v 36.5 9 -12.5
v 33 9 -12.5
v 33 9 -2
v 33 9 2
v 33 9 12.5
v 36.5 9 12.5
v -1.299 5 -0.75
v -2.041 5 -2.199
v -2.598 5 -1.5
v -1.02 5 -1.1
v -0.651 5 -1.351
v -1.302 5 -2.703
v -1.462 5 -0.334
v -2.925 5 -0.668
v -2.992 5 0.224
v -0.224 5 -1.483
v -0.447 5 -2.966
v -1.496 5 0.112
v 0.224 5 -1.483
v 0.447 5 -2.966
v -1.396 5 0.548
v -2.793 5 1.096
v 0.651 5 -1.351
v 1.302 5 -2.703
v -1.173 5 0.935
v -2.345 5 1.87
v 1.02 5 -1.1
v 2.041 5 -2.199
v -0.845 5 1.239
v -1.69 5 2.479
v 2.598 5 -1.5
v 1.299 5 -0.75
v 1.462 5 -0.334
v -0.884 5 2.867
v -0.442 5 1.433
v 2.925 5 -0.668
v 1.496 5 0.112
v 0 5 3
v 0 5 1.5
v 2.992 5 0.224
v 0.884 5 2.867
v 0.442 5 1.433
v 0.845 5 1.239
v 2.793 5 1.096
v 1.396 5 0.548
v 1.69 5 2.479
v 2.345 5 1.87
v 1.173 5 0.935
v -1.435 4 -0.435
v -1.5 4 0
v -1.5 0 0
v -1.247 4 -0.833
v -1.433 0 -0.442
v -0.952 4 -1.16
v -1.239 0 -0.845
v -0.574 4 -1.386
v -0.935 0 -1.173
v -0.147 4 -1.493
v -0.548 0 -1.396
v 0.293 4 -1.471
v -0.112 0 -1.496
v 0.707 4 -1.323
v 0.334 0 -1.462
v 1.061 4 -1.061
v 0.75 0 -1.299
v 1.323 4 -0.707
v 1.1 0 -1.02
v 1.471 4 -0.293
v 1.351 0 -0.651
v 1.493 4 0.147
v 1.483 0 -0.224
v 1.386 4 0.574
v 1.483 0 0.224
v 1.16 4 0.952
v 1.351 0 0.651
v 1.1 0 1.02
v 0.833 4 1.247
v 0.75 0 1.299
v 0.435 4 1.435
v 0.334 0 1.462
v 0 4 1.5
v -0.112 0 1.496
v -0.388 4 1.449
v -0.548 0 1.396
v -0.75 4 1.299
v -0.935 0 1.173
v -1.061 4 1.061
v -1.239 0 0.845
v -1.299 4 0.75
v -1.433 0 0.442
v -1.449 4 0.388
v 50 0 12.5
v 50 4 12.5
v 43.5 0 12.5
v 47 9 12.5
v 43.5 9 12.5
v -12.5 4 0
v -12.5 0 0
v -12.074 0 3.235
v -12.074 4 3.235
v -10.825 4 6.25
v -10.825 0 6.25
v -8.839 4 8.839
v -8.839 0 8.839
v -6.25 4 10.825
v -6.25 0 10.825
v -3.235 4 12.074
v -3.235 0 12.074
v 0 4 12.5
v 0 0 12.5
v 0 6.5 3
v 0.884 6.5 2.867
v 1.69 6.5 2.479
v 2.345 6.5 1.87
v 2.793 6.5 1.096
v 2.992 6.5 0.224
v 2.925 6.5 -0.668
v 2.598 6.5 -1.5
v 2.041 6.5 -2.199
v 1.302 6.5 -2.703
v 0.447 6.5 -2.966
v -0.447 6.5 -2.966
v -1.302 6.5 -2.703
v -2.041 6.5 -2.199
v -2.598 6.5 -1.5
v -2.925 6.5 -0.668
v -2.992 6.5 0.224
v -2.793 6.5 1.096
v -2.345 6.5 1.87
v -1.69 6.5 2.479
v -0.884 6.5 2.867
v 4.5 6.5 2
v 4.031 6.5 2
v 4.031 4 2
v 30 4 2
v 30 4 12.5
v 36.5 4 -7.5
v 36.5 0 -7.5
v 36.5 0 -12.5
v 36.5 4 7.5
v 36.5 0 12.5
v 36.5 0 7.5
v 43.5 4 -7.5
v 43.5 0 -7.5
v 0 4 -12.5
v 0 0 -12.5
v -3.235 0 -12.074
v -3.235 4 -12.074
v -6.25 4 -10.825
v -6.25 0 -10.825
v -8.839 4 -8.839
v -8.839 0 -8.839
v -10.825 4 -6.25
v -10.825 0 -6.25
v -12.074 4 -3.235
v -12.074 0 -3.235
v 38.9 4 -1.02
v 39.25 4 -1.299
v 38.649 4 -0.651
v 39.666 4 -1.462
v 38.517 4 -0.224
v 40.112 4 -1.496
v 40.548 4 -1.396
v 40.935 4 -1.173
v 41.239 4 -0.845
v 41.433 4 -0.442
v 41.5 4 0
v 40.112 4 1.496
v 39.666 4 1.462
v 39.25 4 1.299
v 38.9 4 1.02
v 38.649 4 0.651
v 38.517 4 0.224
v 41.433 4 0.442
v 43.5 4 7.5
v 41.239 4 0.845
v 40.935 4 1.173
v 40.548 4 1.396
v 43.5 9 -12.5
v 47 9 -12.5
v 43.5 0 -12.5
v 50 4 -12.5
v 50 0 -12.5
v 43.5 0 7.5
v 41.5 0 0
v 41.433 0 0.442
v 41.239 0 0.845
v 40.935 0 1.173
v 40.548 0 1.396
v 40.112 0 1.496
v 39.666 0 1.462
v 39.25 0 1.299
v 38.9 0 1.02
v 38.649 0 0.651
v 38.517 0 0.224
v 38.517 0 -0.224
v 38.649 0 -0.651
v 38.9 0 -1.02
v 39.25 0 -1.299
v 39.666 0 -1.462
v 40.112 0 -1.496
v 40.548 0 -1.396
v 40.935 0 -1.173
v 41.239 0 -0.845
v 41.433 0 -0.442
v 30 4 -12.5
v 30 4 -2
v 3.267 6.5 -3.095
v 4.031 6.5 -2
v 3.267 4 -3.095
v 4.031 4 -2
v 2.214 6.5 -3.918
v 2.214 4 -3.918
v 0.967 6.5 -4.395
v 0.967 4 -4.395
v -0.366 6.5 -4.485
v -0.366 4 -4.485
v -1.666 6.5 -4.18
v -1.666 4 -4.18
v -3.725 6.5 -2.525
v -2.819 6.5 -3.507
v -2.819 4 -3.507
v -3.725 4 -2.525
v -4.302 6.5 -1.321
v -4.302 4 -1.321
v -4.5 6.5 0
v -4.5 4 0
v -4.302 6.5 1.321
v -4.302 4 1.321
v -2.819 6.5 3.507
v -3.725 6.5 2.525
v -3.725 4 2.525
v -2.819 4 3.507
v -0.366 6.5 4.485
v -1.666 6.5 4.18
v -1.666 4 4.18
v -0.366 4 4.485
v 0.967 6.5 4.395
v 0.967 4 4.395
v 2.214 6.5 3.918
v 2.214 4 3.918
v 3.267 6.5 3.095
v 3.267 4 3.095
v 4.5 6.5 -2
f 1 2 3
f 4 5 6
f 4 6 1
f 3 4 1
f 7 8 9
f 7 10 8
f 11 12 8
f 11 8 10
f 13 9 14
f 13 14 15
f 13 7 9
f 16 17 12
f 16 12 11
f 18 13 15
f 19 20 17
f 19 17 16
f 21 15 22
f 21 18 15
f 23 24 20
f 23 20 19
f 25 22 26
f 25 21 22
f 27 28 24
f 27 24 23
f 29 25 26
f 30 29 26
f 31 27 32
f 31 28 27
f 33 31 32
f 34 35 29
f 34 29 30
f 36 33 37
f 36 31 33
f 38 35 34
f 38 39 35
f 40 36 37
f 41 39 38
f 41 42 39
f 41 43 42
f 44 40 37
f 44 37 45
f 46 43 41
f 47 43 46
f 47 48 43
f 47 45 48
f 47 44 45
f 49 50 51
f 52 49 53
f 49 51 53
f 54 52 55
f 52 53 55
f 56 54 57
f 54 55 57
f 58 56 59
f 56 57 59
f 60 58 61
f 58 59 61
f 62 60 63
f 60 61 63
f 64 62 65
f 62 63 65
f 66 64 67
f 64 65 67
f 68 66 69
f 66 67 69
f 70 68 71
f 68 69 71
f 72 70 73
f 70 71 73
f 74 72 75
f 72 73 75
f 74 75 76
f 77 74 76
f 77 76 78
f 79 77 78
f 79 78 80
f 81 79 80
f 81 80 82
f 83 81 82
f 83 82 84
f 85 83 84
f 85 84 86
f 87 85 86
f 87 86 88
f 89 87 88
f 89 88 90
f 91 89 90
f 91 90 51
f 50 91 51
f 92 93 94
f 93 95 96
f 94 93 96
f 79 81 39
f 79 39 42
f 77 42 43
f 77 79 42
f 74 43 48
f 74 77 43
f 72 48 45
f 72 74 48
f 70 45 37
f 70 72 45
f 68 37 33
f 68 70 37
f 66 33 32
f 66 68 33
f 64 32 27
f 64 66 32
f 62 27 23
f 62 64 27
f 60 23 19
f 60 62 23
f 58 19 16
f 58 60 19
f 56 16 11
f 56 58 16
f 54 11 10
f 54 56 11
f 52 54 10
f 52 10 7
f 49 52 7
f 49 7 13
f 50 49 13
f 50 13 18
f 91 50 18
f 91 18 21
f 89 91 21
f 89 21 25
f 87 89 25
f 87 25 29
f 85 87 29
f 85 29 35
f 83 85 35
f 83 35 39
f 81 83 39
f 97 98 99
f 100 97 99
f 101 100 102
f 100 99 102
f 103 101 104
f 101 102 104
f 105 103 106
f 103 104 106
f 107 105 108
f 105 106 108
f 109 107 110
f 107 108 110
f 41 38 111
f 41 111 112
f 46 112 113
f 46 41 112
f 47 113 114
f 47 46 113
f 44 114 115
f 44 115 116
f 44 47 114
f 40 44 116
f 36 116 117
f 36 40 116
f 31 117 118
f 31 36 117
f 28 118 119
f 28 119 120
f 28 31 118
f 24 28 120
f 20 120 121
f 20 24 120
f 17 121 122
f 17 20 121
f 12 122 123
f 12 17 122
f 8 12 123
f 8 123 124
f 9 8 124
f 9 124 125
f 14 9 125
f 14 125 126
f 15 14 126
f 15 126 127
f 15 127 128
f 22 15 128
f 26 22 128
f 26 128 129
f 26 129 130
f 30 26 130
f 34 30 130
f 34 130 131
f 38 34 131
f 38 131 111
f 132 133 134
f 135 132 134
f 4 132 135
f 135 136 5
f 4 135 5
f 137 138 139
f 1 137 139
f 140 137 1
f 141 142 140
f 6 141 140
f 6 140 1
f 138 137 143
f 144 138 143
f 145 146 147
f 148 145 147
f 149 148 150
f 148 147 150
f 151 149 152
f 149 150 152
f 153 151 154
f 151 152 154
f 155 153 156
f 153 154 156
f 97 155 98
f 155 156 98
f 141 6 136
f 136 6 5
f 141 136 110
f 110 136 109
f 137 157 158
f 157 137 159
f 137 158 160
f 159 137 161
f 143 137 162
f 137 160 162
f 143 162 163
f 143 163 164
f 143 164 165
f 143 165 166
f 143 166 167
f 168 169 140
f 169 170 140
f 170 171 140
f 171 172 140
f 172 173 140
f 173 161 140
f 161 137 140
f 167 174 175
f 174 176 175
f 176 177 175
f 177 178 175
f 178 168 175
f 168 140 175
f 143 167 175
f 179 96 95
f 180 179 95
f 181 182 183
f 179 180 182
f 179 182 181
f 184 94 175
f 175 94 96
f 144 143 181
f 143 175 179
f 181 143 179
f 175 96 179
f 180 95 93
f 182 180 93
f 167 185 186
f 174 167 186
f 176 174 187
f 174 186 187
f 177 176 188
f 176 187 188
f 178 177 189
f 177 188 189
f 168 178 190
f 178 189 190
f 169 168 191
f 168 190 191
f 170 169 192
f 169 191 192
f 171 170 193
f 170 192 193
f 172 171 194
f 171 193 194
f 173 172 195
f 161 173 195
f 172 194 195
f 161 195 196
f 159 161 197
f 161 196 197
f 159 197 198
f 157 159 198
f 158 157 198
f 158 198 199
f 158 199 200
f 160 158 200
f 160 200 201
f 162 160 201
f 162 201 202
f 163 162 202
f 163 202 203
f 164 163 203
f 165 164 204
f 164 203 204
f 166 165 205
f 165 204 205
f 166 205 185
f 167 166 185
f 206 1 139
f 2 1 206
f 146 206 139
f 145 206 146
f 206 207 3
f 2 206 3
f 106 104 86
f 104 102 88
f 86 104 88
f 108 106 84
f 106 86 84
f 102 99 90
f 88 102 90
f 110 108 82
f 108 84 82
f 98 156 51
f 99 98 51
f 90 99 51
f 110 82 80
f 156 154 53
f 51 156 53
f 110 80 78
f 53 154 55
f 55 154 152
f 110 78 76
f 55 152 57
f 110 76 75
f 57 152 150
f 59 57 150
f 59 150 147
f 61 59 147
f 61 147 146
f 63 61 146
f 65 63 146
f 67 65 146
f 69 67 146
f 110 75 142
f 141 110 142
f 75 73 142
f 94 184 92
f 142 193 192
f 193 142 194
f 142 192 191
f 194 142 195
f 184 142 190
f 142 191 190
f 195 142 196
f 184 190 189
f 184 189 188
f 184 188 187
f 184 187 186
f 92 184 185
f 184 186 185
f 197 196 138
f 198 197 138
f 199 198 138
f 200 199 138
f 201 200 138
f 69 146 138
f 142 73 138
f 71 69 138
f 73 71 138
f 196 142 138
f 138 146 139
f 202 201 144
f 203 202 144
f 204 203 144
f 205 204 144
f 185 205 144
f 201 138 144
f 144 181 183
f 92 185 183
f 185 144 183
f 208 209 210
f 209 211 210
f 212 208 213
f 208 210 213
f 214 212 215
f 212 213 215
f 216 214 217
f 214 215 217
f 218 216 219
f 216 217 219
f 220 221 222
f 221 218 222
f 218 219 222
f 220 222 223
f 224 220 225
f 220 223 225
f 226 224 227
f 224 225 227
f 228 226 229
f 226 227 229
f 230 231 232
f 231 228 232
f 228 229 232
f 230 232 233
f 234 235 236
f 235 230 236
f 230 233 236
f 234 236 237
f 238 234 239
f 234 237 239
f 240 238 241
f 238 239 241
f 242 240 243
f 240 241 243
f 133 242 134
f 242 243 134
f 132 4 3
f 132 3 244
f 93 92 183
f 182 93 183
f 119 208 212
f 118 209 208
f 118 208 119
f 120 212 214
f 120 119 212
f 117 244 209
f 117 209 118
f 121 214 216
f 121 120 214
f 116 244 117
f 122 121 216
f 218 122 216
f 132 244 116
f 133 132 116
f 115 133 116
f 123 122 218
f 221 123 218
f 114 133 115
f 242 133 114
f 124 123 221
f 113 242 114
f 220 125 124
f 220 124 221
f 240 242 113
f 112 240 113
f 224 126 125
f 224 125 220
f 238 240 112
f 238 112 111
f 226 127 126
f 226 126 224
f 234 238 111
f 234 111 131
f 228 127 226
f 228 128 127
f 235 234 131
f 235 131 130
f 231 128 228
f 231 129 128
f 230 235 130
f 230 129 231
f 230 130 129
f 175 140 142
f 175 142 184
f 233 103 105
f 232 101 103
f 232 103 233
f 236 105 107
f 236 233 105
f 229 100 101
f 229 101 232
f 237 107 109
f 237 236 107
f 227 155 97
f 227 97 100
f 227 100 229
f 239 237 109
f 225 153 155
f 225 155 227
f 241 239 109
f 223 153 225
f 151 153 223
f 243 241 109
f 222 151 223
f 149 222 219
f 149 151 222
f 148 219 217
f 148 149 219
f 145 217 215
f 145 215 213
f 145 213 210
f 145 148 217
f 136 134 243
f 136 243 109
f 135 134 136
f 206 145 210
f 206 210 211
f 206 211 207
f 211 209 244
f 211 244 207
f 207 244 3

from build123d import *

# Parameters (mm, degrees)
EXTRUDE_1_DEPTH     = 4
SKETCH_2_R          = 4.5
SKETCH_2_R_2        = 3
EXTRUDE_2_DEPTH     = 2.5
EXTRUDE_3_DEPTH     = 25
SKETCH_4_W          = 7
SKETCH_4_H          = 5
CUT_EXTRUDE_1_DEPTH = 57.621550668
SKETCH_5_W          = 7
SKETCH_5_H          = 5
CUT_EXTRUDE_2_DEPTH = 52.780787943
EXTRUDE_4_DEPTH     = 2
SKETCH_7_R          = 3
SKETCH_7_R_2        = 1.5
EXTRUDE_5_DEPTH     = 1


with BuildPart() as part:
    # 草图1 → 凸台-拉伸1 (new body)
    with BuildSketch(Plane(origin=(0, 0, 0), x_dir=(1, 0, 0), z_dir=(0, 1, 0))):
        with BuildLine():
            ThreePointArc((12.5, 0), (8.838834765, 8.838834765), (0, 12.5))
            ThreePointArc((0, 12.5), (-8.838834765, 8.838834765), (-12.5, 0))
            Line((-12.5, 0), (-1.5, 0))
            ThreePointArc((-1.5, 0), (0, 1.5), (1.5, 0))
            Line((1.5, 0), (12.5, 0))
        make_face()
        with BuildLine():
            ThreePointArc((0, -12.5), (8.838834765, -8.838834765), (12.5, 0))
            Line((12.5, 0), (1.5, 0))
            ThreePointArc((1.5, 0), (0, -1.5), (-1.5, 0))
            Line((-1.5, 0), (-12.5, 0))
            ThreePointArc((-12.5, 0), (-8.838834765, -8.838834765), (0, -12.5))
        make_face()
        with BuildLine():
            Line((50, 12.5), (0, 12.5))
            ThreePointArc((0, 12.5), (8.838834765, 8.838834765), (12.5, 0))
            Line((12.5, 0), (38.5, 0))
            ThreePointArc((38.5, 0), (40, 1.5), (41.5, 0))
            Line((41.5, 0), (50, 0))
            Line((50, 0), (50, 12.5))
        make_face()
        with BuildLine():
            Line((38.5, 0), (12.5, 0))
            ThreePointArc((12.5, 0), (8.838834765, -8.838834765), (0, -12.5))
            Line((0, -12.5), (50, -12.5))
            Line((50, -12.5), (50, 0))
            Line((50, 0), (41.5, 0))
            ThreePointArc((41.5, 0), (40, -1.5), (38.5, 0))
        make_face()
    extrude(amount=EXTRUDE_1_DEPTH)

    # 草图2 → 凸台-拉伸2 (add)
    with BuildSketch(Plane(origin=(0, 4, 0), x_dir=(1, 0, 0), z_dir=(0, 1, 0))):
        with Locations(Location((0, 0, 0), (0, 0, 270))):
            Circle(SKETCH_2_R)
        with Locations(Location((0, 0, 0), (0, 0, 270))):
            Circle(SKETCH_2_R_2, mode=Mode.SUBTRACT)
    extrude(amount=EXTRUDE_2_DEPTH)

    # 草图3 → 凸台-拉伸3 (add)
    with BuildSketch(Plane.XY.offset(12.5)):
        Polygon((33, 9), (47, 9), (50, 4), (30, 4), align=None)
    extrude(amount=-EXTRUDE_3_DEPTH)

    # 草图4 → 切除-拉伸1 (cut, through all)
    with BuildSketch(Plane.XY.offset(12.5)):
        with Locations((40, 6.5)):
            Rectangle(SKETCH_4_W, SKETCH_4_H)
    extrude(amount=-CUT_EXTRUDE_1_DEPTH, mode=Mode.SUBTRACT)

    # 草图5 → 切除-拉伸2 (cut, through all)
    with BuildSketch(Plane(origin=(0, 4, 0), x_dir=(1, 0, 0), z_dir=(0, 1, 0))):
        with Locations((40, -10)):
            Rectangle(SKETCH_5_W, SKETCH_5_H)
        with Locations((40, 10)):
            Rectangle(SKETCH_5_W, SKETCH_5_H)
    extrude(amount=-CUT_EXTRUDE_2_DEPTH, mode=Mode.SUBTRACT)

    # 草图6 → 凸台-拉伸4 (add, symmetric)
    with BuildSketch(Plane.XY):
        Polygon((30, 4), (33, 9), (4.5, 6.5), (3.215772895, 6.5), (3.215772895, 4), align=None)
    extrude(amount=EXTRUDE_4_DEPTH, both=True)

    # 草图7 → 凸台-拉伸5 (add)
    with BuildSketch(Plane(origin=(0, 4, 0), x_dir=(1, 0, 0), z_dir=(0, 1, 0))):
        with Locations(Location((0, 0, 0), (0, 0, 270))):
            Circle(SKETCH_7_R)
        with Locations(Location((0, 0, 0), (0, 0, 270))):
            Circle(SKETCH_7_R_2, mode=Mode.SUBTRACT)
    extrude(amount=EXTRUDE_5_DEPTH)


solid = part.part
